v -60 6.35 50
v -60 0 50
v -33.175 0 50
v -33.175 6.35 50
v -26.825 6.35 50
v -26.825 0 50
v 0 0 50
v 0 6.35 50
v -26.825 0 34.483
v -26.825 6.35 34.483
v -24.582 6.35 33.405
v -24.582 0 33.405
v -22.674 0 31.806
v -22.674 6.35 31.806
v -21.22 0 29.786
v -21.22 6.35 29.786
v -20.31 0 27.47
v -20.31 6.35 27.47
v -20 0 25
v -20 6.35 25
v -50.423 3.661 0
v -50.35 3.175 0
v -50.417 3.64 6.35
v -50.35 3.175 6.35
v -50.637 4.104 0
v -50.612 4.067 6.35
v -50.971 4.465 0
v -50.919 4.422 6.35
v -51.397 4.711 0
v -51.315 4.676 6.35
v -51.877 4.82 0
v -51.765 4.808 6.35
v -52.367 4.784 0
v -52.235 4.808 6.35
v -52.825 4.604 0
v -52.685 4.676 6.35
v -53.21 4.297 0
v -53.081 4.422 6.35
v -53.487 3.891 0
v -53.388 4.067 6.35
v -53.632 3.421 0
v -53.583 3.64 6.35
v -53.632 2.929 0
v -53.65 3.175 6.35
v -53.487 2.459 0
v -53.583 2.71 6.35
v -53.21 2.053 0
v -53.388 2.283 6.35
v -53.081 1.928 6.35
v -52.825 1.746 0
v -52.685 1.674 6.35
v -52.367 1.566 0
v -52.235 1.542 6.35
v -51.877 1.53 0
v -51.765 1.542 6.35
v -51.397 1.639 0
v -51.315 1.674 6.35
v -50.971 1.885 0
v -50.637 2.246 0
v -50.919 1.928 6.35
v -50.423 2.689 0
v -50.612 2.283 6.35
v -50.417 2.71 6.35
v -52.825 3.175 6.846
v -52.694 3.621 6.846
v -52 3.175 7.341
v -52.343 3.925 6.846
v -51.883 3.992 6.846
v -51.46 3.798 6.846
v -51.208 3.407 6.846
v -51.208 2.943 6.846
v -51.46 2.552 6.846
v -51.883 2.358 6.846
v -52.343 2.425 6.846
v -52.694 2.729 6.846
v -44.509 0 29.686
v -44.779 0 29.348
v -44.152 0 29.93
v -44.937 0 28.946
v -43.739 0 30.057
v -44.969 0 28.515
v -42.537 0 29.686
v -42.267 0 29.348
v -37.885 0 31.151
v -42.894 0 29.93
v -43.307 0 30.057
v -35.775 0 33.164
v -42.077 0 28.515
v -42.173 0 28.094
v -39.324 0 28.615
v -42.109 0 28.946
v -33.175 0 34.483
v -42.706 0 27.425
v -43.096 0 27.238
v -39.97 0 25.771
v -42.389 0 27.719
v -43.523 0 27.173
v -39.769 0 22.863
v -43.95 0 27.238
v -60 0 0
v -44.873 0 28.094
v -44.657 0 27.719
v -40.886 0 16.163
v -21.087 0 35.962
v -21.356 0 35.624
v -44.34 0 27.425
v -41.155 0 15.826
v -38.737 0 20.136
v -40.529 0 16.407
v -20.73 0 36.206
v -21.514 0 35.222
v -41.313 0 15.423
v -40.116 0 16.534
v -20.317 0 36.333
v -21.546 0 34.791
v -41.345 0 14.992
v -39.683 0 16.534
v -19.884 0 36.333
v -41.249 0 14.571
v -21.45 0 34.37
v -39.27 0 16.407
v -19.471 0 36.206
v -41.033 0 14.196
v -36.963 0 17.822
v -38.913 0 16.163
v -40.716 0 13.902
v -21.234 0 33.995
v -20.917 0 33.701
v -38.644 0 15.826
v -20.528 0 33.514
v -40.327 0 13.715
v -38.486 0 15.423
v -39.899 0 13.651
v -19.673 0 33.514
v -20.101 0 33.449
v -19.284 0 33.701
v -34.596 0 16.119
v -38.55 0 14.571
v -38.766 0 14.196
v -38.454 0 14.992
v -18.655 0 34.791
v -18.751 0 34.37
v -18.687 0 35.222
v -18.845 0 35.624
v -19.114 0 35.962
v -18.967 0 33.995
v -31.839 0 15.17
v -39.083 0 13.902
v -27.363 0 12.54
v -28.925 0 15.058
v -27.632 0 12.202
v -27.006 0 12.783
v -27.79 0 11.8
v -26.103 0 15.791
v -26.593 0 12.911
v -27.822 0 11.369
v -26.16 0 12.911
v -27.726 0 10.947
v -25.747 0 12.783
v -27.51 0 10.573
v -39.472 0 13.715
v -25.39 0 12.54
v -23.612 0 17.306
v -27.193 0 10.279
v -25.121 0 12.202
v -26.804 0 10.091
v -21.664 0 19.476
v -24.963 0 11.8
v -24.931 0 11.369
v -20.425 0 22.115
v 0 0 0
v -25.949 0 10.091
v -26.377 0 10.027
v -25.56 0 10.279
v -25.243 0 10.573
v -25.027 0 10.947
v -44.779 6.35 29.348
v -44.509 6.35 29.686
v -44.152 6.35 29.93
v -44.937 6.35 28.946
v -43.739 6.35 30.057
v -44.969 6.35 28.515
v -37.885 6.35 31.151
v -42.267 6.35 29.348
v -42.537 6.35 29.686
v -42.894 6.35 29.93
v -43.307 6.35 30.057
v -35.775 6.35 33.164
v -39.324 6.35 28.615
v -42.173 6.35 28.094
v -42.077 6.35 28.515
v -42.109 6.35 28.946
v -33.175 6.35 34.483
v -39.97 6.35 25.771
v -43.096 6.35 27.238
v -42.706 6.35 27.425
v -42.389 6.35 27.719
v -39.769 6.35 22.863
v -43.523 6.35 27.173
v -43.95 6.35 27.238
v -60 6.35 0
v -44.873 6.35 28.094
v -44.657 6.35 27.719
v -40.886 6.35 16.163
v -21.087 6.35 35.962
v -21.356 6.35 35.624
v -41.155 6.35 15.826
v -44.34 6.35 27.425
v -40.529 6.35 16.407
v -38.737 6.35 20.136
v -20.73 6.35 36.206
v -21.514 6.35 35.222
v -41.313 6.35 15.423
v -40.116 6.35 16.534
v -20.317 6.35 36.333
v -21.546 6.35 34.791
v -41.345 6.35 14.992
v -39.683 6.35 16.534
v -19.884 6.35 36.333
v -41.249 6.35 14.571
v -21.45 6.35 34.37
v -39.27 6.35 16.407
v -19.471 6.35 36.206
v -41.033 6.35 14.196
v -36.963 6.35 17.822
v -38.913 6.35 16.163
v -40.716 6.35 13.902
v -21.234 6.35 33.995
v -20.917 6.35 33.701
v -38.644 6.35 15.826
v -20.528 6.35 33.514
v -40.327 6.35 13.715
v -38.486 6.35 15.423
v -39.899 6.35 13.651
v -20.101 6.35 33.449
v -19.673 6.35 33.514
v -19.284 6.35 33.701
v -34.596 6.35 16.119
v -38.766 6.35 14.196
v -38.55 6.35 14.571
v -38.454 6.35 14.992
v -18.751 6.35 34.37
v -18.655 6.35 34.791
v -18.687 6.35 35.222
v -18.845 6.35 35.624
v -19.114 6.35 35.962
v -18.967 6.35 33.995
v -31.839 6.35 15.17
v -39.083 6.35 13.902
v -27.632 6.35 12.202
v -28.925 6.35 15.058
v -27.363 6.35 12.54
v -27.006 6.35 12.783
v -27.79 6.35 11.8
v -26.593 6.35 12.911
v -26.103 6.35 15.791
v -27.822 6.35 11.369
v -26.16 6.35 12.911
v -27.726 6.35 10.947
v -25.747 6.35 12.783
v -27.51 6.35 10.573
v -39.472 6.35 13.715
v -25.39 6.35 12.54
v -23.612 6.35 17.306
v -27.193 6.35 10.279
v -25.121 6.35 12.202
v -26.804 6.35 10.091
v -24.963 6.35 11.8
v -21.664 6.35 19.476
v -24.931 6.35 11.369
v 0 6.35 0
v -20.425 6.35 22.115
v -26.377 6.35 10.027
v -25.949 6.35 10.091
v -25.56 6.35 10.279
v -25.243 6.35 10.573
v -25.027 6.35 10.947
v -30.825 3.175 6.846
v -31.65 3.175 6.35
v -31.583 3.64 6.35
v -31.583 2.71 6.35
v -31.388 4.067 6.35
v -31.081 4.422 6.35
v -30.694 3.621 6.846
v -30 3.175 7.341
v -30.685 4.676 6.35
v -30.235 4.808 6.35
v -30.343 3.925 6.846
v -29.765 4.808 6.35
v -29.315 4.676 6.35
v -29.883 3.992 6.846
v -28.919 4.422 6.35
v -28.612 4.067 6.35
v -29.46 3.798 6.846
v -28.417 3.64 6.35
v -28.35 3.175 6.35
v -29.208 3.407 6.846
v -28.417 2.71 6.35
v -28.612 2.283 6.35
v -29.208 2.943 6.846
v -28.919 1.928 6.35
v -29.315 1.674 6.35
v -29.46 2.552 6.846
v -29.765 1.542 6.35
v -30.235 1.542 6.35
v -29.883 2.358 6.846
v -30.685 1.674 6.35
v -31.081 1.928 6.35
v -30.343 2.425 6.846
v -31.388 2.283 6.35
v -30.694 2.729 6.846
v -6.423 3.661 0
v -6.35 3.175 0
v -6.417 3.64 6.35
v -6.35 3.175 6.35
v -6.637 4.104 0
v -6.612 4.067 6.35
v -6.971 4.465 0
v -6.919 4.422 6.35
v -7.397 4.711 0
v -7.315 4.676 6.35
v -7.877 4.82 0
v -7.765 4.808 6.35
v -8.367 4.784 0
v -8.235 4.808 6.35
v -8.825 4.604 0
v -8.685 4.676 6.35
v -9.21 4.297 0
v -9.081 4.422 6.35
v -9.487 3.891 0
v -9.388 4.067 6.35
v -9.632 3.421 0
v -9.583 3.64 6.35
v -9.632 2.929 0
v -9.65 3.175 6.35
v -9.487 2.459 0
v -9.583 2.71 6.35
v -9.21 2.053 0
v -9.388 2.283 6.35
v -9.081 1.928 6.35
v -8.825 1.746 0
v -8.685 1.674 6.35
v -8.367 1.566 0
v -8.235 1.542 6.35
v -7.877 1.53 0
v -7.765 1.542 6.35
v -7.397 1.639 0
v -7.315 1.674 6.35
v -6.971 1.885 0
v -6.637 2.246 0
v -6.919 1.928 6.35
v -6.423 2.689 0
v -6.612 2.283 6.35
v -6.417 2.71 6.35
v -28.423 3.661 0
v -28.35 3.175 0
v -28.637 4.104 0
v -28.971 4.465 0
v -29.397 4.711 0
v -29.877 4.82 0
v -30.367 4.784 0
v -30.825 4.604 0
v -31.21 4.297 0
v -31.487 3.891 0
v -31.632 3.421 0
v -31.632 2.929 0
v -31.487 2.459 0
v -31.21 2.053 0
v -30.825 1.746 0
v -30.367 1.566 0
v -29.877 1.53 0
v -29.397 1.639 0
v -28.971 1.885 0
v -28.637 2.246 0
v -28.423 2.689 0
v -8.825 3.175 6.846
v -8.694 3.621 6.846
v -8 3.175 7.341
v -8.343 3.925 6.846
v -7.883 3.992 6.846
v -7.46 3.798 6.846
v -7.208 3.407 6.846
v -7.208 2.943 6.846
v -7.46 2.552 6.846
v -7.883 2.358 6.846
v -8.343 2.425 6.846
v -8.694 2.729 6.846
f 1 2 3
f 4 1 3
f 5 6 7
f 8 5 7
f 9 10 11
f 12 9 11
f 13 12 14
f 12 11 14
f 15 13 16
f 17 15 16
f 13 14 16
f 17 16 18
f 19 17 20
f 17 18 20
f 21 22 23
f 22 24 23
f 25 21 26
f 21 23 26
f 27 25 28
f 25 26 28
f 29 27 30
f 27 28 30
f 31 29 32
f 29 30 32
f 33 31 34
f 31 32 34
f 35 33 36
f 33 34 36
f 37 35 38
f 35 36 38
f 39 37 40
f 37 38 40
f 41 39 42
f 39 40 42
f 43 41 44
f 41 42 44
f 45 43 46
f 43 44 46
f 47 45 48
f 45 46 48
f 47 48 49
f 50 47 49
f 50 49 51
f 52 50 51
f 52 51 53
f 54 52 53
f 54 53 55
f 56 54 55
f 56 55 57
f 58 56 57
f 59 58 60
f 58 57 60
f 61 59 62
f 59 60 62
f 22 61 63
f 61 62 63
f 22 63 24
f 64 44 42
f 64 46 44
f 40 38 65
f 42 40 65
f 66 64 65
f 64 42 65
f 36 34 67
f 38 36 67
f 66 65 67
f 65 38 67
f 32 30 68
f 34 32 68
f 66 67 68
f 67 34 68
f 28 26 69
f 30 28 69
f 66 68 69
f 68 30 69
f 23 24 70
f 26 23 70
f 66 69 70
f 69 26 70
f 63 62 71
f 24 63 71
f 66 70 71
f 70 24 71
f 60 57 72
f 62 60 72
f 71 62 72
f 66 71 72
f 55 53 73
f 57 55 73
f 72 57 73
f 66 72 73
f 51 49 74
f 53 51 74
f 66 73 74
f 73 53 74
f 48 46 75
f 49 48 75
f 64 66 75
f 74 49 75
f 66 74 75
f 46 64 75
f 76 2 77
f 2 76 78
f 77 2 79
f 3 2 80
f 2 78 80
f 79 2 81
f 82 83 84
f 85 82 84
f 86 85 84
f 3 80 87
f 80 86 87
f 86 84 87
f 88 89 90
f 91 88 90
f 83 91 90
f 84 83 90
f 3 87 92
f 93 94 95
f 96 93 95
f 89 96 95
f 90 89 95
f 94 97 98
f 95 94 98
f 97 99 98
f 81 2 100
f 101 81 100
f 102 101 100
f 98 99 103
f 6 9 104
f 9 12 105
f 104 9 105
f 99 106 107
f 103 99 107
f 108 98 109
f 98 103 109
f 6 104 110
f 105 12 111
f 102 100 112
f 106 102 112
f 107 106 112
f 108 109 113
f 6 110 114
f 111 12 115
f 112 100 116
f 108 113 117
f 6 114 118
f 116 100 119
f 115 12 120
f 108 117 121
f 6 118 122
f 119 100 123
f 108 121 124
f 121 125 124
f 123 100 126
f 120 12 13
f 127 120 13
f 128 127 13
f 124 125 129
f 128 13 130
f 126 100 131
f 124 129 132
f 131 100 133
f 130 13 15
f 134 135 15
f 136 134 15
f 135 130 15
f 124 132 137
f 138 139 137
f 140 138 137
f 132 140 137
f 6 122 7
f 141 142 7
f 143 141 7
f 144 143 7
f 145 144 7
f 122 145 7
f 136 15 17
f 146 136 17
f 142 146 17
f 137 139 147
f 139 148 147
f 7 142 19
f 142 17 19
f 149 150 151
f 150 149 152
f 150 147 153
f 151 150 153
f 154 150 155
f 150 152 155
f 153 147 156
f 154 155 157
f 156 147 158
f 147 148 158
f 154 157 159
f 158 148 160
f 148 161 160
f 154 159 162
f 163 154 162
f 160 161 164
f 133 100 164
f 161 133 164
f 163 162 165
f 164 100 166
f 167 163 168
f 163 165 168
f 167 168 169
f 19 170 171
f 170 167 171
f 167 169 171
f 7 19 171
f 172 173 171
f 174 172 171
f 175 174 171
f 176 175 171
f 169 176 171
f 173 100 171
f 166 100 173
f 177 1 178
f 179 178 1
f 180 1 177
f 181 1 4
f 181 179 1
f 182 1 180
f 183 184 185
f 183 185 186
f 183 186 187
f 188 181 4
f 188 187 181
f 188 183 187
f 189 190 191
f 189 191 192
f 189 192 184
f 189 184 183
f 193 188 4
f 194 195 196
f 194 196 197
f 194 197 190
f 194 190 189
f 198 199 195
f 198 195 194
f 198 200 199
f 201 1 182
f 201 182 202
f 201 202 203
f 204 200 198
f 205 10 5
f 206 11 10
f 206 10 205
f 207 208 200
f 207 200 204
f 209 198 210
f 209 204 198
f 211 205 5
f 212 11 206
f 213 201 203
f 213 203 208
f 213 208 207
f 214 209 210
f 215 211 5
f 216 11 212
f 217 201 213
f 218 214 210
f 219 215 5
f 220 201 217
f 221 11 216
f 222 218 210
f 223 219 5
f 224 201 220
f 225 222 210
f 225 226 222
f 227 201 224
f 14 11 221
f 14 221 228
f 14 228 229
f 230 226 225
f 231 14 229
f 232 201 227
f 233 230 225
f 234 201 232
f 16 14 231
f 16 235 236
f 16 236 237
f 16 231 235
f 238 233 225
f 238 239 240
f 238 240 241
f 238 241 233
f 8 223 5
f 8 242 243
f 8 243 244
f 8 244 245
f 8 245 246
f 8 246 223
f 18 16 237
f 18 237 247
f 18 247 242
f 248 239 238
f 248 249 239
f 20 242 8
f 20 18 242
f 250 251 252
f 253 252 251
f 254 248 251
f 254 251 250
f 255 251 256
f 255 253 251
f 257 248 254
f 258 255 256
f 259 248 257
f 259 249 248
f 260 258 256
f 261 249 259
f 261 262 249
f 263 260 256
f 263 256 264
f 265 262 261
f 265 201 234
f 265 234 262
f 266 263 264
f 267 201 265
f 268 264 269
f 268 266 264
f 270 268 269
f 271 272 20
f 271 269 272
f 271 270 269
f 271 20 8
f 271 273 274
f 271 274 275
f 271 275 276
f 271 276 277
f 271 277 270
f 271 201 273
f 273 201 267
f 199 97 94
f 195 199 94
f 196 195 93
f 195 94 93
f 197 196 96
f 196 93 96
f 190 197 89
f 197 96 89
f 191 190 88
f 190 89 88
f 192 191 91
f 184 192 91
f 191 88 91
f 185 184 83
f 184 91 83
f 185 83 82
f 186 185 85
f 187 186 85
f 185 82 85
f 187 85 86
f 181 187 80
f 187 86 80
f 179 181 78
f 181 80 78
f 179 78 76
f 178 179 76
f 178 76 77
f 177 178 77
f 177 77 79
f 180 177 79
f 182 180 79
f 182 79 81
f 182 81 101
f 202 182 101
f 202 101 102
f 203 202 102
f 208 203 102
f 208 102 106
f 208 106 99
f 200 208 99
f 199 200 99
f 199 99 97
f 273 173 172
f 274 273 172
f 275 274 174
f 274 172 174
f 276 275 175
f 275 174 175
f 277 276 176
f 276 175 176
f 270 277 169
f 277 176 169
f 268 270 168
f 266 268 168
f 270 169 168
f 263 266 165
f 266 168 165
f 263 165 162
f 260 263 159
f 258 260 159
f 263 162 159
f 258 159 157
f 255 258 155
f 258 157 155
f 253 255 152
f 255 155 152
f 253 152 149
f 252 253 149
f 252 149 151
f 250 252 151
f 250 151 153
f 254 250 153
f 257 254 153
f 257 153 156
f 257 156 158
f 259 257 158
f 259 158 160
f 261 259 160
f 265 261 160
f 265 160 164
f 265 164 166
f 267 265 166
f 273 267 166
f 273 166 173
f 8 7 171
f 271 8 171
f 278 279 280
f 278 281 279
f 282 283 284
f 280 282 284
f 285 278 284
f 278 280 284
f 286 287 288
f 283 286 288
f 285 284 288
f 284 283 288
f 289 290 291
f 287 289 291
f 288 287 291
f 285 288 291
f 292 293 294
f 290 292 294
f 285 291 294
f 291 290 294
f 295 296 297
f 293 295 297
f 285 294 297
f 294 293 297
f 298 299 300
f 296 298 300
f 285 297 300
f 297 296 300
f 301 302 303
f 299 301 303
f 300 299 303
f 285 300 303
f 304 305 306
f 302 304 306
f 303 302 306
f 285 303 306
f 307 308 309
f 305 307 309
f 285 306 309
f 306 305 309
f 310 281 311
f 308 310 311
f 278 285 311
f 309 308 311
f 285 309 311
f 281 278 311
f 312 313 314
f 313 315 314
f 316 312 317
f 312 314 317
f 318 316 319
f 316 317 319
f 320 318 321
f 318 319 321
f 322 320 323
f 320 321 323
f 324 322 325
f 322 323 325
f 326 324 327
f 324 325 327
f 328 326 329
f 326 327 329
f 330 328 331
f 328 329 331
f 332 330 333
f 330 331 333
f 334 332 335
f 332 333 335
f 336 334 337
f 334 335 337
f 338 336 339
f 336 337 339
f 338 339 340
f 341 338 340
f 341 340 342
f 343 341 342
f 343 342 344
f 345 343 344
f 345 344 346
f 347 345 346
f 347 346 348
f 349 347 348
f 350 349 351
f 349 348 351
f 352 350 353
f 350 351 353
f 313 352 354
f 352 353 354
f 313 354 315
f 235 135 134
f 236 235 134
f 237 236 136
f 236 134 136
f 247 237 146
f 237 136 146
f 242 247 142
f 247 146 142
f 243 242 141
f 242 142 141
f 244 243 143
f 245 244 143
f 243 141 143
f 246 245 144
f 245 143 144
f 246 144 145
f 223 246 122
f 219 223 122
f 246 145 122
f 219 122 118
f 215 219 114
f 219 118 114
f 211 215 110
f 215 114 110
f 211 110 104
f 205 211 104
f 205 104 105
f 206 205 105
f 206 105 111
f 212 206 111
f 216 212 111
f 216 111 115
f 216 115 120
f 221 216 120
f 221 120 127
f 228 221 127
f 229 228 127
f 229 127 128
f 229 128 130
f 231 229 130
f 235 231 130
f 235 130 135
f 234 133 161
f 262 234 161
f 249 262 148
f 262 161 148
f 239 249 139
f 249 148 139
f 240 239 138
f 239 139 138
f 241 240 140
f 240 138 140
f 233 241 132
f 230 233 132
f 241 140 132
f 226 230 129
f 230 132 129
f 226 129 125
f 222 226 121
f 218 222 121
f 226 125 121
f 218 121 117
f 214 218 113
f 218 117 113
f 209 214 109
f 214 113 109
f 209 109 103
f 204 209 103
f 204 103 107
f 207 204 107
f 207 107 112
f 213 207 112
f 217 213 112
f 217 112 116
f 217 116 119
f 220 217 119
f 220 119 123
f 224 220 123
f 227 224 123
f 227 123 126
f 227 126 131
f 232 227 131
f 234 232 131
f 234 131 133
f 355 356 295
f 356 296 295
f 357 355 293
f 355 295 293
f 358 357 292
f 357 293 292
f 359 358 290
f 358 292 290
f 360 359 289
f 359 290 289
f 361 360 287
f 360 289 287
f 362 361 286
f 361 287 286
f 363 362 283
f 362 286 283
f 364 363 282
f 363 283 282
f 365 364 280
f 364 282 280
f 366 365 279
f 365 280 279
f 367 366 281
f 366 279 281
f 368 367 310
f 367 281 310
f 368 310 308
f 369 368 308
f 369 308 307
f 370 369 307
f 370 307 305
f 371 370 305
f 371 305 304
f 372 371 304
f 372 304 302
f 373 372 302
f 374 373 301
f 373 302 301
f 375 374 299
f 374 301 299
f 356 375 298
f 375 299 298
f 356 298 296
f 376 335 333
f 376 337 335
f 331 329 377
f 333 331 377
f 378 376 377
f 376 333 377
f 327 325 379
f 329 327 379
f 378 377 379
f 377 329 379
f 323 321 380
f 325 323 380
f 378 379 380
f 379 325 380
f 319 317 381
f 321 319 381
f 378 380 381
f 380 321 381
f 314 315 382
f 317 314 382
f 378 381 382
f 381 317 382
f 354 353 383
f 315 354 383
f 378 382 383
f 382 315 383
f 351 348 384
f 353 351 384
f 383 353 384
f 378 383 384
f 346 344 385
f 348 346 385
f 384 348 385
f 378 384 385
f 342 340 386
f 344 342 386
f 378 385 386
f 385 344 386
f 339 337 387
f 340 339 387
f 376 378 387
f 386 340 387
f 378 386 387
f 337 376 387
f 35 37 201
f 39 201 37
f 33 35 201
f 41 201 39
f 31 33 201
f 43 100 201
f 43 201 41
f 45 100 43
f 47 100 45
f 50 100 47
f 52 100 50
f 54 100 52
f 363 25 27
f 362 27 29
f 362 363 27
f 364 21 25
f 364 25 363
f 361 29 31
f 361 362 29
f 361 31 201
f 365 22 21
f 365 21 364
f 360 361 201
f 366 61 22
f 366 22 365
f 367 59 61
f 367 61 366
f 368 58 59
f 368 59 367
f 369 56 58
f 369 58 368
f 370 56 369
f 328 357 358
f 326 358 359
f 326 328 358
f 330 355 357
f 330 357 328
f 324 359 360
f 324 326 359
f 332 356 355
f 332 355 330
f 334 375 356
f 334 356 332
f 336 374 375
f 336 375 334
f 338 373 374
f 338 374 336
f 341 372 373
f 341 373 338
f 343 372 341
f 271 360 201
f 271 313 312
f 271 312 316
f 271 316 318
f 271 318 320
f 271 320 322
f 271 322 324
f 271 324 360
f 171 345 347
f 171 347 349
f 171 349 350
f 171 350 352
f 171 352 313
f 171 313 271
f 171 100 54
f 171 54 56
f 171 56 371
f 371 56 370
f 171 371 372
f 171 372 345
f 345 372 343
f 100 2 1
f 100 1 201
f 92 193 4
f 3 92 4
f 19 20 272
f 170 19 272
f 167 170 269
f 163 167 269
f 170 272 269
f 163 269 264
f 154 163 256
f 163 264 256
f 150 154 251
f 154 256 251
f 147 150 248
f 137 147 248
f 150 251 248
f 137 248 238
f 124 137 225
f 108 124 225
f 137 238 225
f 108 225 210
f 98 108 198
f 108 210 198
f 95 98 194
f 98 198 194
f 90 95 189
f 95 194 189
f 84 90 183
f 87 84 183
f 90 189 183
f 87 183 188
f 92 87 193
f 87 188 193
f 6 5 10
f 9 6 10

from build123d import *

# Parameters (mm, degrees)
SKETCH1_W                 = 60
SKETCH1_H                 = 50
BOSS_EXTRUDE1_DEPTH       = 6.35
CUT_EXTRUDE1_DEPTH        = 6.35
M3_5X0_6_TAPPED_HOLE1_D   = 2.9
M4X0_7_TAPPED_HOLE1_D     = 3.3
M4X0_7_TAPPED_HOLE1_DEPTH = 6.35
M4X0_7_TAPPED_HOLE1_TIP   = 0.991420021


with BuildPart() as part:
    # Sketch1 → Boss-Extrude1 (new body)
    with BuildSketch(Plane(origin=(0, 0, 0), x_dir=(1, 0, 0), z_dir=(0, 1, 0))):
        with Locations((-30, -25)):
            Rectangle(SKETCH1_W, SKETCH1_H)
    extrude(amount=BOSS_EXTRUDE1_DEPTH)

    # Sketch2 → Cut-Extrude1 (cut)
    with BuildSketch(Plane(origin=(0, 6.35, 0), x_dir=(1, 0, 0), z_dir=(0, 1, 0))):
        with BuildLine():
            Line((-26.825, -34.482582718), (-26.825, -20))
            Line((-26.825, -20), (-33.175, -20))
            Line((-33.175, -20), (-33.175, -34.482582718))
            ThreePointArc((-33.175, -34.482582718), (-30, -35), (-26.825, -34.482582718))
        make_face()
        with BuildLine():
            Line((-33.175, -20), (-26.825, -20))
            Line((-26.825, -20), (-26.825, -34.482582718))
            ThreePointArc((-26.825, -34.482582718), (-21.88365846, -30.841660723), (-20, -25))
            ThreePointArc((-20, -25), (-35.841660723, -16.88365846), (-33.175, -34.482582718))
            Line((-33.175, -34.482582718), (-33.175, -20))
        make_face()
        with BuildLine():
            Line((-26.825, -50), (-26.825, -34.482582718))
            ThreePointArc((-26.825, -34.482582718), (-30, -35), (-33.175, -34.482582718))
            Line((-33.175, -34.482582718), (-33.175, -50))
            Line((-33.175, -50), (-26.825, -50))
        make_face()
    extrude(amount=-CUT_EXTRUDE1_DEPTH, mode=Mode.SUBTRACT)

    # M3.5x0.6 Tapped Hole1 (through all)
    with Locations(Plane(origin=(-26.376533369, 6.35, 11.477038432), x_dir=(0, 0, 1), z_dir=(0, 1, 0))):
        with Locations((0, 0), (3.623466631, -13.522961568), (17.146428199, -17.146428199), (23.422456505, 6.276028306)):
            Hole(M3_5X0_6_TAPPED_HOLE1_D / 2)

    # M4x0.7 Tapped Hole1
    with Locations(Plane(origin=(-8, 3.175, 0), x_dir=(-1, 0, 0), z_dir=(0, 0, -1))):
        with Locations((0, 0), (22, 0), (44, 0)):
            Hole(M4X0_7_TAPPED_HOLE1_D / 2, depth=M4X0_7_TAPPED_HOLE1_DEPTH)
            with Locations((0, 0, -(M4X0_7_TAPPED_HOLE1_DEPTH + M4X0_7_TAPPED_HOLE1_TIP / 2))):  # 118° drill point
                Cone(0, M4X0_7_TAPPED_HOLE1_D / 2, M4X0_7_TAPPED_HOLE1_TIP, mode=Mode.SUBTRACT)


solid = part.part
